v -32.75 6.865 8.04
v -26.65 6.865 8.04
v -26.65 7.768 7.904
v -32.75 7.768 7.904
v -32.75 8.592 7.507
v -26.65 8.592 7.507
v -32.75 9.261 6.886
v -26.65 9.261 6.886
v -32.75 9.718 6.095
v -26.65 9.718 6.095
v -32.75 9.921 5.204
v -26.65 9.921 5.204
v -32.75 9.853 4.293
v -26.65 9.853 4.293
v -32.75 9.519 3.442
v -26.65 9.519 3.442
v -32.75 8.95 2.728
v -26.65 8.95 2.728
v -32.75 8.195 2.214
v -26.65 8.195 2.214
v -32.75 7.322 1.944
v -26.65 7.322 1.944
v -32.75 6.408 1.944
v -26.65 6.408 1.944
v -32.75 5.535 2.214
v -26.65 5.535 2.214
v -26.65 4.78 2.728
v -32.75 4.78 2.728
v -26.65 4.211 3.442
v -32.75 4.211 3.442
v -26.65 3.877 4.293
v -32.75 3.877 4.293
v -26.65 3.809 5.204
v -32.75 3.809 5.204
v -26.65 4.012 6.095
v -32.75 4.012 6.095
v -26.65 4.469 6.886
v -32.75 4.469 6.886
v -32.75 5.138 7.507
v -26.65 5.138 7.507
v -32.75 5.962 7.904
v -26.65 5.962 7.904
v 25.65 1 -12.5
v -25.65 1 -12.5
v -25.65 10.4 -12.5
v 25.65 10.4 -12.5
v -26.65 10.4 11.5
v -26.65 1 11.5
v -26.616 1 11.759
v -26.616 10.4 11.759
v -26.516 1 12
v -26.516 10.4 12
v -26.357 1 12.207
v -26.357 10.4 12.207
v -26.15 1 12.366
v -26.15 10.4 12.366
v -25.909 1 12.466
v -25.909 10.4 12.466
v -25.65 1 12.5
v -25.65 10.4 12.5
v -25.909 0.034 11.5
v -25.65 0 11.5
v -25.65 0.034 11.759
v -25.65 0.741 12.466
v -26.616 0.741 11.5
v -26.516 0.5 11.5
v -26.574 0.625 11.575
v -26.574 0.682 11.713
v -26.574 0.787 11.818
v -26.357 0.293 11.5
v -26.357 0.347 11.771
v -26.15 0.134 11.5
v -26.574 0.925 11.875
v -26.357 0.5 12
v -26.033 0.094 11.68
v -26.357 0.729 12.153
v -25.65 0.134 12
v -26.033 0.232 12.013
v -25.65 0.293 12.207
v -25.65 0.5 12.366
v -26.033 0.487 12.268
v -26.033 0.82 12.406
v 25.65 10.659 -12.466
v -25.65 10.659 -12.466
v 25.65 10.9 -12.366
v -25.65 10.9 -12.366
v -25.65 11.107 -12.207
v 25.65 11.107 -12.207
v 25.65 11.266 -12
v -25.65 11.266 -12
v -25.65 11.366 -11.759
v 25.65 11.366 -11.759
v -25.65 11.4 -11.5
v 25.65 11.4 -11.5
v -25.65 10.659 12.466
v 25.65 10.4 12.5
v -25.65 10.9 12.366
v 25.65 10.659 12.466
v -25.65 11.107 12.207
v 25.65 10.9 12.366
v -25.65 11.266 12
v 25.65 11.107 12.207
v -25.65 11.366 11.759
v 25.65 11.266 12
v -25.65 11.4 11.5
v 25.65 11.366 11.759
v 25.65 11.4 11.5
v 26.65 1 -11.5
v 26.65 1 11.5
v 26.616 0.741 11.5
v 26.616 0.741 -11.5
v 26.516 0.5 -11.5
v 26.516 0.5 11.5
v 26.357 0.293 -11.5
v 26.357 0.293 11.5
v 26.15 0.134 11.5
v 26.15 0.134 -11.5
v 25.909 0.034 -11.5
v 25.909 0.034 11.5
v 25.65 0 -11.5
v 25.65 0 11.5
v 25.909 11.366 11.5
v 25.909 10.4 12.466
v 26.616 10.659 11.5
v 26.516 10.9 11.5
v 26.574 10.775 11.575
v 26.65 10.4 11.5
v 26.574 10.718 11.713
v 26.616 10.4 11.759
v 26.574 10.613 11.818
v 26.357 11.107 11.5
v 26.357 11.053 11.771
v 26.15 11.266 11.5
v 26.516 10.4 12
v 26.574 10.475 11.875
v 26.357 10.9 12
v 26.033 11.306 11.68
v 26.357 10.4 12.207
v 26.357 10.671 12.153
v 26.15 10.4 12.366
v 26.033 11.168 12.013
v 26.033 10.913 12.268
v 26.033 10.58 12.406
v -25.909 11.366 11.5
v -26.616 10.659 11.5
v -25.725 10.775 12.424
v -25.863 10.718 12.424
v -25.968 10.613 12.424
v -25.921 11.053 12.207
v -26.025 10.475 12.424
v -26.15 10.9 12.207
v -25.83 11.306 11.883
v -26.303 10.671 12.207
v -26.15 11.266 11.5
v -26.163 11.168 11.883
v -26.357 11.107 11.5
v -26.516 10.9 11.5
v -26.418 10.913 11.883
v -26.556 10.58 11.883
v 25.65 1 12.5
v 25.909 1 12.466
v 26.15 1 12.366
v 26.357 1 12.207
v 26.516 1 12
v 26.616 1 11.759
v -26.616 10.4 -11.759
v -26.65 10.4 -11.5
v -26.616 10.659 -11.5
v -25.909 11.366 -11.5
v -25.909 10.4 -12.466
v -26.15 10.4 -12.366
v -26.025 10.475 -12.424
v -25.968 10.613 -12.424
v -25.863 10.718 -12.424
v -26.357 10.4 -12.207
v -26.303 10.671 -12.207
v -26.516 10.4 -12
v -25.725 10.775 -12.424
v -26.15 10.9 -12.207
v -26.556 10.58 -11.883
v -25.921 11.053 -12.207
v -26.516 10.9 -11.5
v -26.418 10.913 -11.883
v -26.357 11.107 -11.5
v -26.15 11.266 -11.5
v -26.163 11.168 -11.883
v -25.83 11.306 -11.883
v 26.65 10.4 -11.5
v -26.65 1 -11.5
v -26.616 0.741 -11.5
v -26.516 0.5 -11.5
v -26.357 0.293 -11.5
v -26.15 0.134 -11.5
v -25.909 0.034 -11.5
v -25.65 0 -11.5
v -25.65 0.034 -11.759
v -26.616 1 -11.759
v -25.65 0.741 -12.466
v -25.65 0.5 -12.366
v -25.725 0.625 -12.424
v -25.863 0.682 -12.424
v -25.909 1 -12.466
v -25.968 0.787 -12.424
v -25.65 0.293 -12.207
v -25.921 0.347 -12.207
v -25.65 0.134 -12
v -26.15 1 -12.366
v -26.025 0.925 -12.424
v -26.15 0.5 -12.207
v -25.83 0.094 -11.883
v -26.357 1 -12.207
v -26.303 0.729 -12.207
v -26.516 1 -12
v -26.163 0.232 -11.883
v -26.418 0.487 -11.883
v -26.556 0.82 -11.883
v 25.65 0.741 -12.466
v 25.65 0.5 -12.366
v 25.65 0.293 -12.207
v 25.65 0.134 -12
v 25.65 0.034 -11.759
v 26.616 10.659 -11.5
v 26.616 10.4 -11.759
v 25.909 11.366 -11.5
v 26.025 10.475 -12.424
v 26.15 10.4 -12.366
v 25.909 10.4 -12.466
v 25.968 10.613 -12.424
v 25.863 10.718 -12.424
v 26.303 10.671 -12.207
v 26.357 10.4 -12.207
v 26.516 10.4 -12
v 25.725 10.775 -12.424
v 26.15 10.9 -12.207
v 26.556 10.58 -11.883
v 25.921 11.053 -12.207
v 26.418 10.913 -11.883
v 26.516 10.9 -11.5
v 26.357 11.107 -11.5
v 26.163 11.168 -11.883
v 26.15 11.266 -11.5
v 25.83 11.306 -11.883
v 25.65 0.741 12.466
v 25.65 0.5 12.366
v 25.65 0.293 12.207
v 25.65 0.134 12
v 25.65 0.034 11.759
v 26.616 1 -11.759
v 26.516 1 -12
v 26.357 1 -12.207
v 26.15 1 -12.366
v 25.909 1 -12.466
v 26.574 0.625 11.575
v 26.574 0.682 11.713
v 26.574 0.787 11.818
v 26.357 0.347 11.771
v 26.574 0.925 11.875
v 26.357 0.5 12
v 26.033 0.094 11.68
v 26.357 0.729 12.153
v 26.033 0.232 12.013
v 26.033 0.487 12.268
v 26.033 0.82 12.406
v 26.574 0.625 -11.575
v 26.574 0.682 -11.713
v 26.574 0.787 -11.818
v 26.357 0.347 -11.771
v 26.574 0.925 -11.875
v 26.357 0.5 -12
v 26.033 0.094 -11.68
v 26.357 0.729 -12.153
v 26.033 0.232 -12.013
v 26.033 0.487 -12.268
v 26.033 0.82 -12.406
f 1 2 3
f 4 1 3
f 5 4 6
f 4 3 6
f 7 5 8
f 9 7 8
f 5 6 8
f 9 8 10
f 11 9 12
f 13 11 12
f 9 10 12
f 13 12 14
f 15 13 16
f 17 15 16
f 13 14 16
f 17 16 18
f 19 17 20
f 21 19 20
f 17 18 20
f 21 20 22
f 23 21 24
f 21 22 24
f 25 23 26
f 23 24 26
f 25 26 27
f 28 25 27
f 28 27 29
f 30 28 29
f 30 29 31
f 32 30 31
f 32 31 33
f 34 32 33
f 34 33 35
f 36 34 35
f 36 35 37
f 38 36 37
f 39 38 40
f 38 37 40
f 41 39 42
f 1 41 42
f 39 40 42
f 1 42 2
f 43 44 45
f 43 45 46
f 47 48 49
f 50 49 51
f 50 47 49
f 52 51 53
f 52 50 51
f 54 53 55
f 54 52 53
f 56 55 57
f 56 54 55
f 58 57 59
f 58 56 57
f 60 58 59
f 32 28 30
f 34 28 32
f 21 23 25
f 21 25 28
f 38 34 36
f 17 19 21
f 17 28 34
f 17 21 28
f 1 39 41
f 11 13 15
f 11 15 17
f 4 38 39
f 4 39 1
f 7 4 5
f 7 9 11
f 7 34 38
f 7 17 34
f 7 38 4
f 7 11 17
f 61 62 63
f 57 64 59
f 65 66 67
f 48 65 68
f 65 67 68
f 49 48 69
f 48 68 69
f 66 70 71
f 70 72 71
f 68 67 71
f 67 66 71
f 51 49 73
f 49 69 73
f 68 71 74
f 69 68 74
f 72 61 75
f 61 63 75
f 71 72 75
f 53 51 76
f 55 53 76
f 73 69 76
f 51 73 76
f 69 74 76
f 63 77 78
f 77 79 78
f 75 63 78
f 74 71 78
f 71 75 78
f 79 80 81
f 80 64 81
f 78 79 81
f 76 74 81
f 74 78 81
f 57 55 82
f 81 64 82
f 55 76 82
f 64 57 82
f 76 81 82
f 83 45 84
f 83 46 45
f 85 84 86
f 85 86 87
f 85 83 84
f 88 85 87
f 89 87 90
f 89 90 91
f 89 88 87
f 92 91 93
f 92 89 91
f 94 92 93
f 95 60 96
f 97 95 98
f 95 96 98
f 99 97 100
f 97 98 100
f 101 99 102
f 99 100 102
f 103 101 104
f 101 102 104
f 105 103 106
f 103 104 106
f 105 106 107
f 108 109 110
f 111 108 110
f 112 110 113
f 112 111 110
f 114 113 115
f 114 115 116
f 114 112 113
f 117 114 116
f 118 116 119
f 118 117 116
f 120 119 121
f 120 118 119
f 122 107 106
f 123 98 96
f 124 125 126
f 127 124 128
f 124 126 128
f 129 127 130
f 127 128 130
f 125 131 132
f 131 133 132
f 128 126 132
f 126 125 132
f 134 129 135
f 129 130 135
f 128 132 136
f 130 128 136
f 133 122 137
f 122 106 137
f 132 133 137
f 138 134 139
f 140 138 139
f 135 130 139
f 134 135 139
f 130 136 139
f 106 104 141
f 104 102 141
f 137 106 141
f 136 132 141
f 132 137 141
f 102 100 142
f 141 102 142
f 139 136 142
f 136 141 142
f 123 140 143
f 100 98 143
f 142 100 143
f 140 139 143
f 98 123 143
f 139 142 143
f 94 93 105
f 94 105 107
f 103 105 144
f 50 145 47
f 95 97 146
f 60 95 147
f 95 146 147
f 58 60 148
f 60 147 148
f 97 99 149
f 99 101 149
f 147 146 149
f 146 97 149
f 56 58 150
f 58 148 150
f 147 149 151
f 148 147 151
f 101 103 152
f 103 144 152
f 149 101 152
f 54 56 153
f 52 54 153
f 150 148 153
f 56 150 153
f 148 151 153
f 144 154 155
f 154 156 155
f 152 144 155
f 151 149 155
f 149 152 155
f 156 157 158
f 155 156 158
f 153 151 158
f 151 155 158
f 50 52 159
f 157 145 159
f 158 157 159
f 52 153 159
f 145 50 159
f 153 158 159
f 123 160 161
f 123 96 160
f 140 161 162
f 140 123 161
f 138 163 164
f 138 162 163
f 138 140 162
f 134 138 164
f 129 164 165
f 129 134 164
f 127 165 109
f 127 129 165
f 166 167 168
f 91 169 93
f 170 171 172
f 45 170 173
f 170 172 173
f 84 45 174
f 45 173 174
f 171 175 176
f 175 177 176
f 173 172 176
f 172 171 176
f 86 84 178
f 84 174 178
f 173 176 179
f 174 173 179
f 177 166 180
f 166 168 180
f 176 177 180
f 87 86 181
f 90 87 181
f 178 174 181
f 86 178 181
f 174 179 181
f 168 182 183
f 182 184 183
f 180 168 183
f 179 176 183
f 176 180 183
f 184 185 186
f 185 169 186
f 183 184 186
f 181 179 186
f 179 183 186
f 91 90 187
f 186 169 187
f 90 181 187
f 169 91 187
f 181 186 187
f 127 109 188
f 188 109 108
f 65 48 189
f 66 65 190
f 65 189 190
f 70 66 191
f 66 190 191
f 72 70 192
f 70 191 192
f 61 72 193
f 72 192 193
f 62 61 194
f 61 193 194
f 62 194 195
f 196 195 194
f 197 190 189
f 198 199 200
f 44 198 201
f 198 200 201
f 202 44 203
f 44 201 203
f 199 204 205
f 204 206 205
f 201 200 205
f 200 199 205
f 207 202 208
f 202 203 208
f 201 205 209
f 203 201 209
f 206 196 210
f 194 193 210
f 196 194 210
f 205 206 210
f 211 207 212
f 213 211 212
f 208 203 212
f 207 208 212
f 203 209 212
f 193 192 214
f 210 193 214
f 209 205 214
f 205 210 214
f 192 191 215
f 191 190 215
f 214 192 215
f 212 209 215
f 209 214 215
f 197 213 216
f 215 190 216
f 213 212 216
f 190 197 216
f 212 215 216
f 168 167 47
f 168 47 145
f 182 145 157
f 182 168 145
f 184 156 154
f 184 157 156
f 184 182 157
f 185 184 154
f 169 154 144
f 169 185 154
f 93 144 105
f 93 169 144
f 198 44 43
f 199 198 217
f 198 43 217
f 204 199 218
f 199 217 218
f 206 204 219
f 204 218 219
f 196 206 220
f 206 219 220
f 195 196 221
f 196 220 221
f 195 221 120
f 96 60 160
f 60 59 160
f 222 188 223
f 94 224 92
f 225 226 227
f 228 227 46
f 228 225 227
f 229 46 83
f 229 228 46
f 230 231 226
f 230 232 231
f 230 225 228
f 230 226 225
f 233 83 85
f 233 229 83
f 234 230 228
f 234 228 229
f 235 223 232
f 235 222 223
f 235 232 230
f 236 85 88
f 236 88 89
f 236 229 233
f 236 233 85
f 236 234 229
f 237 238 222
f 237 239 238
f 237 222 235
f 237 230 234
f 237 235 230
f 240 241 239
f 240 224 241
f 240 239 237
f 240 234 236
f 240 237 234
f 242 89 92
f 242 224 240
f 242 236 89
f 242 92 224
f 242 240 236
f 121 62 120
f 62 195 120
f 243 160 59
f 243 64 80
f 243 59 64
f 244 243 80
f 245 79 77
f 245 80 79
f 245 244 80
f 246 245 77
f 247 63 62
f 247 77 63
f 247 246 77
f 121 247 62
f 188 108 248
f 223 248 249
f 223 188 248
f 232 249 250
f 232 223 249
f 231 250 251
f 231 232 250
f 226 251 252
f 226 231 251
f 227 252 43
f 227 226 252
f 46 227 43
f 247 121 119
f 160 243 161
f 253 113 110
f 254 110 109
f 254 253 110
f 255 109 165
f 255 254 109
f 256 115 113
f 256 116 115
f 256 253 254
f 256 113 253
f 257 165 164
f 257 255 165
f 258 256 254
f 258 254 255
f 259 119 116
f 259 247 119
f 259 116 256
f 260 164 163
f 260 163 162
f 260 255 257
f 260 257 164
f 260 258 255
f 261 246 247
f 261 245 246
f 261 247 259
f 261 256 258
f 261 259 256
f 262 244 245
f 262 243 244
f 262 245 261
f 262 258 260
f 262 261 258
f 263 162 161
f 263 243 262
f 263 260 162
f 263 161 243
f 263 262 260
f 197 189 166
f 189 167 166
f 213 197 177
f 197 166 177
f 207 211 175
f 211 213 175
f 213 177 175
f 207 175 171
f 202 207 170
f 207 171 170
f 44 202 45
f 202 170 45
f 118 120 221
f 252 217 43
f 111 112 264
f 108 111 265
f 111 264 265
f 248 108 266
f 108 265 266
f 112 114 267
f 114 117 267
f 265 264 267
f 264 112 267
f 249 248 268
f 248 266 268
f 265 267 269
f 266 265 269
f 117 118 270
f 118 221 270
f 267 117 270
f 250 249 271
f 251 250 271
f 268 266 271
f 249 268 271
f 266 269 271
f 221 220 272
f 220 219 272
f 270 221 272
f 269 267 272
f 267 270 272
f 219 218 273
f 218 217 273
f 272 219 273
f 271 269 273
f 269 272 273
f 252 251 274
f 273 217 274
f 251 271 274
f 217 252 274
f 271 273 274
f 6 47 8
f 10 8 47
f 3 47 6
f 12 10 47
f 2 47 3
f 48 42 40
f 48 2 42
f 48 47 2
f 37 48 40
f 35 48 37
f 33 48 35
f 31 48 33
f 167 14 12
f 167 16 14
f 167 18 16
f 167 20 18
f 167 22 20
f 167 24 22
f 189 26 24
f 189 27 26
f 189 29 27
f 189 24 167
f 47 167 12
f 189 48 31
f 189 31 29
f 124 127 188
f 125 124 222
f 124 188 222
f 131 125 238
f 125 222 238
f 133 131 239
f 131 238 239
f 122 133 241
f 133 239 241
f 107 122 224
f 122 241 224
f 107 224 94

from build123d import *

# Parameters (mm, degrees)
SKETCH1_W           = 53.3
SKETCH1_H           = 25
BOSS_EXTRUDE1_DEPTH = 11.4
FILLET1_R           = 1
SKETCH2_R           = 3.065
BOSS_EXTRUDE2_DEPTH = 6.1


with BuildPart() as part:
    # Sketch1 → Boss-Extrude1 (new body)
    with BuildSketch(Plane(origin=(0, 0, 0), x_dir=(1, 0, 0), z_dir=(0, 1, 0))):
        Rectangle(SKETCH1_W, SKETCH1_H)
    extrude(amount=BOSS_EXTRUDE1_DEPTH)

    # Fillet1
    fillet1_edges = [part.edges().sort_by_distance(p)[0] for p in [
        (-26.65, 11.4, 0),
        (0, 11.4, 12.5),
        (26.65, 11.4, 0),
        (0, 0, 12.5),
        (-26.65, 0, 0),
        (0, 0, -12.5),
        (26.65, 0, 0),
        (26.65, 5.7, 12.5),
        (-26.65, 5.7, 12.5),
        (-26.65, 5.7, -12.5),
        (26.65, 5.7, -12.5),
        (0, 11.4, -12.5),
    ]]
    fillet(fillet1_edges, radius=FILLET1_R)

    # Sketch2 → Boss-Extrude2 (add)
    with BuildSketch(Plane.ZY.offset(26.65)):
        with Locations((4.975, 6.865)):
            Circle(SKETCH2_R)
    extrude(amount=BOSS_EXTRUDE2_DEPTH)


solid = part.part
